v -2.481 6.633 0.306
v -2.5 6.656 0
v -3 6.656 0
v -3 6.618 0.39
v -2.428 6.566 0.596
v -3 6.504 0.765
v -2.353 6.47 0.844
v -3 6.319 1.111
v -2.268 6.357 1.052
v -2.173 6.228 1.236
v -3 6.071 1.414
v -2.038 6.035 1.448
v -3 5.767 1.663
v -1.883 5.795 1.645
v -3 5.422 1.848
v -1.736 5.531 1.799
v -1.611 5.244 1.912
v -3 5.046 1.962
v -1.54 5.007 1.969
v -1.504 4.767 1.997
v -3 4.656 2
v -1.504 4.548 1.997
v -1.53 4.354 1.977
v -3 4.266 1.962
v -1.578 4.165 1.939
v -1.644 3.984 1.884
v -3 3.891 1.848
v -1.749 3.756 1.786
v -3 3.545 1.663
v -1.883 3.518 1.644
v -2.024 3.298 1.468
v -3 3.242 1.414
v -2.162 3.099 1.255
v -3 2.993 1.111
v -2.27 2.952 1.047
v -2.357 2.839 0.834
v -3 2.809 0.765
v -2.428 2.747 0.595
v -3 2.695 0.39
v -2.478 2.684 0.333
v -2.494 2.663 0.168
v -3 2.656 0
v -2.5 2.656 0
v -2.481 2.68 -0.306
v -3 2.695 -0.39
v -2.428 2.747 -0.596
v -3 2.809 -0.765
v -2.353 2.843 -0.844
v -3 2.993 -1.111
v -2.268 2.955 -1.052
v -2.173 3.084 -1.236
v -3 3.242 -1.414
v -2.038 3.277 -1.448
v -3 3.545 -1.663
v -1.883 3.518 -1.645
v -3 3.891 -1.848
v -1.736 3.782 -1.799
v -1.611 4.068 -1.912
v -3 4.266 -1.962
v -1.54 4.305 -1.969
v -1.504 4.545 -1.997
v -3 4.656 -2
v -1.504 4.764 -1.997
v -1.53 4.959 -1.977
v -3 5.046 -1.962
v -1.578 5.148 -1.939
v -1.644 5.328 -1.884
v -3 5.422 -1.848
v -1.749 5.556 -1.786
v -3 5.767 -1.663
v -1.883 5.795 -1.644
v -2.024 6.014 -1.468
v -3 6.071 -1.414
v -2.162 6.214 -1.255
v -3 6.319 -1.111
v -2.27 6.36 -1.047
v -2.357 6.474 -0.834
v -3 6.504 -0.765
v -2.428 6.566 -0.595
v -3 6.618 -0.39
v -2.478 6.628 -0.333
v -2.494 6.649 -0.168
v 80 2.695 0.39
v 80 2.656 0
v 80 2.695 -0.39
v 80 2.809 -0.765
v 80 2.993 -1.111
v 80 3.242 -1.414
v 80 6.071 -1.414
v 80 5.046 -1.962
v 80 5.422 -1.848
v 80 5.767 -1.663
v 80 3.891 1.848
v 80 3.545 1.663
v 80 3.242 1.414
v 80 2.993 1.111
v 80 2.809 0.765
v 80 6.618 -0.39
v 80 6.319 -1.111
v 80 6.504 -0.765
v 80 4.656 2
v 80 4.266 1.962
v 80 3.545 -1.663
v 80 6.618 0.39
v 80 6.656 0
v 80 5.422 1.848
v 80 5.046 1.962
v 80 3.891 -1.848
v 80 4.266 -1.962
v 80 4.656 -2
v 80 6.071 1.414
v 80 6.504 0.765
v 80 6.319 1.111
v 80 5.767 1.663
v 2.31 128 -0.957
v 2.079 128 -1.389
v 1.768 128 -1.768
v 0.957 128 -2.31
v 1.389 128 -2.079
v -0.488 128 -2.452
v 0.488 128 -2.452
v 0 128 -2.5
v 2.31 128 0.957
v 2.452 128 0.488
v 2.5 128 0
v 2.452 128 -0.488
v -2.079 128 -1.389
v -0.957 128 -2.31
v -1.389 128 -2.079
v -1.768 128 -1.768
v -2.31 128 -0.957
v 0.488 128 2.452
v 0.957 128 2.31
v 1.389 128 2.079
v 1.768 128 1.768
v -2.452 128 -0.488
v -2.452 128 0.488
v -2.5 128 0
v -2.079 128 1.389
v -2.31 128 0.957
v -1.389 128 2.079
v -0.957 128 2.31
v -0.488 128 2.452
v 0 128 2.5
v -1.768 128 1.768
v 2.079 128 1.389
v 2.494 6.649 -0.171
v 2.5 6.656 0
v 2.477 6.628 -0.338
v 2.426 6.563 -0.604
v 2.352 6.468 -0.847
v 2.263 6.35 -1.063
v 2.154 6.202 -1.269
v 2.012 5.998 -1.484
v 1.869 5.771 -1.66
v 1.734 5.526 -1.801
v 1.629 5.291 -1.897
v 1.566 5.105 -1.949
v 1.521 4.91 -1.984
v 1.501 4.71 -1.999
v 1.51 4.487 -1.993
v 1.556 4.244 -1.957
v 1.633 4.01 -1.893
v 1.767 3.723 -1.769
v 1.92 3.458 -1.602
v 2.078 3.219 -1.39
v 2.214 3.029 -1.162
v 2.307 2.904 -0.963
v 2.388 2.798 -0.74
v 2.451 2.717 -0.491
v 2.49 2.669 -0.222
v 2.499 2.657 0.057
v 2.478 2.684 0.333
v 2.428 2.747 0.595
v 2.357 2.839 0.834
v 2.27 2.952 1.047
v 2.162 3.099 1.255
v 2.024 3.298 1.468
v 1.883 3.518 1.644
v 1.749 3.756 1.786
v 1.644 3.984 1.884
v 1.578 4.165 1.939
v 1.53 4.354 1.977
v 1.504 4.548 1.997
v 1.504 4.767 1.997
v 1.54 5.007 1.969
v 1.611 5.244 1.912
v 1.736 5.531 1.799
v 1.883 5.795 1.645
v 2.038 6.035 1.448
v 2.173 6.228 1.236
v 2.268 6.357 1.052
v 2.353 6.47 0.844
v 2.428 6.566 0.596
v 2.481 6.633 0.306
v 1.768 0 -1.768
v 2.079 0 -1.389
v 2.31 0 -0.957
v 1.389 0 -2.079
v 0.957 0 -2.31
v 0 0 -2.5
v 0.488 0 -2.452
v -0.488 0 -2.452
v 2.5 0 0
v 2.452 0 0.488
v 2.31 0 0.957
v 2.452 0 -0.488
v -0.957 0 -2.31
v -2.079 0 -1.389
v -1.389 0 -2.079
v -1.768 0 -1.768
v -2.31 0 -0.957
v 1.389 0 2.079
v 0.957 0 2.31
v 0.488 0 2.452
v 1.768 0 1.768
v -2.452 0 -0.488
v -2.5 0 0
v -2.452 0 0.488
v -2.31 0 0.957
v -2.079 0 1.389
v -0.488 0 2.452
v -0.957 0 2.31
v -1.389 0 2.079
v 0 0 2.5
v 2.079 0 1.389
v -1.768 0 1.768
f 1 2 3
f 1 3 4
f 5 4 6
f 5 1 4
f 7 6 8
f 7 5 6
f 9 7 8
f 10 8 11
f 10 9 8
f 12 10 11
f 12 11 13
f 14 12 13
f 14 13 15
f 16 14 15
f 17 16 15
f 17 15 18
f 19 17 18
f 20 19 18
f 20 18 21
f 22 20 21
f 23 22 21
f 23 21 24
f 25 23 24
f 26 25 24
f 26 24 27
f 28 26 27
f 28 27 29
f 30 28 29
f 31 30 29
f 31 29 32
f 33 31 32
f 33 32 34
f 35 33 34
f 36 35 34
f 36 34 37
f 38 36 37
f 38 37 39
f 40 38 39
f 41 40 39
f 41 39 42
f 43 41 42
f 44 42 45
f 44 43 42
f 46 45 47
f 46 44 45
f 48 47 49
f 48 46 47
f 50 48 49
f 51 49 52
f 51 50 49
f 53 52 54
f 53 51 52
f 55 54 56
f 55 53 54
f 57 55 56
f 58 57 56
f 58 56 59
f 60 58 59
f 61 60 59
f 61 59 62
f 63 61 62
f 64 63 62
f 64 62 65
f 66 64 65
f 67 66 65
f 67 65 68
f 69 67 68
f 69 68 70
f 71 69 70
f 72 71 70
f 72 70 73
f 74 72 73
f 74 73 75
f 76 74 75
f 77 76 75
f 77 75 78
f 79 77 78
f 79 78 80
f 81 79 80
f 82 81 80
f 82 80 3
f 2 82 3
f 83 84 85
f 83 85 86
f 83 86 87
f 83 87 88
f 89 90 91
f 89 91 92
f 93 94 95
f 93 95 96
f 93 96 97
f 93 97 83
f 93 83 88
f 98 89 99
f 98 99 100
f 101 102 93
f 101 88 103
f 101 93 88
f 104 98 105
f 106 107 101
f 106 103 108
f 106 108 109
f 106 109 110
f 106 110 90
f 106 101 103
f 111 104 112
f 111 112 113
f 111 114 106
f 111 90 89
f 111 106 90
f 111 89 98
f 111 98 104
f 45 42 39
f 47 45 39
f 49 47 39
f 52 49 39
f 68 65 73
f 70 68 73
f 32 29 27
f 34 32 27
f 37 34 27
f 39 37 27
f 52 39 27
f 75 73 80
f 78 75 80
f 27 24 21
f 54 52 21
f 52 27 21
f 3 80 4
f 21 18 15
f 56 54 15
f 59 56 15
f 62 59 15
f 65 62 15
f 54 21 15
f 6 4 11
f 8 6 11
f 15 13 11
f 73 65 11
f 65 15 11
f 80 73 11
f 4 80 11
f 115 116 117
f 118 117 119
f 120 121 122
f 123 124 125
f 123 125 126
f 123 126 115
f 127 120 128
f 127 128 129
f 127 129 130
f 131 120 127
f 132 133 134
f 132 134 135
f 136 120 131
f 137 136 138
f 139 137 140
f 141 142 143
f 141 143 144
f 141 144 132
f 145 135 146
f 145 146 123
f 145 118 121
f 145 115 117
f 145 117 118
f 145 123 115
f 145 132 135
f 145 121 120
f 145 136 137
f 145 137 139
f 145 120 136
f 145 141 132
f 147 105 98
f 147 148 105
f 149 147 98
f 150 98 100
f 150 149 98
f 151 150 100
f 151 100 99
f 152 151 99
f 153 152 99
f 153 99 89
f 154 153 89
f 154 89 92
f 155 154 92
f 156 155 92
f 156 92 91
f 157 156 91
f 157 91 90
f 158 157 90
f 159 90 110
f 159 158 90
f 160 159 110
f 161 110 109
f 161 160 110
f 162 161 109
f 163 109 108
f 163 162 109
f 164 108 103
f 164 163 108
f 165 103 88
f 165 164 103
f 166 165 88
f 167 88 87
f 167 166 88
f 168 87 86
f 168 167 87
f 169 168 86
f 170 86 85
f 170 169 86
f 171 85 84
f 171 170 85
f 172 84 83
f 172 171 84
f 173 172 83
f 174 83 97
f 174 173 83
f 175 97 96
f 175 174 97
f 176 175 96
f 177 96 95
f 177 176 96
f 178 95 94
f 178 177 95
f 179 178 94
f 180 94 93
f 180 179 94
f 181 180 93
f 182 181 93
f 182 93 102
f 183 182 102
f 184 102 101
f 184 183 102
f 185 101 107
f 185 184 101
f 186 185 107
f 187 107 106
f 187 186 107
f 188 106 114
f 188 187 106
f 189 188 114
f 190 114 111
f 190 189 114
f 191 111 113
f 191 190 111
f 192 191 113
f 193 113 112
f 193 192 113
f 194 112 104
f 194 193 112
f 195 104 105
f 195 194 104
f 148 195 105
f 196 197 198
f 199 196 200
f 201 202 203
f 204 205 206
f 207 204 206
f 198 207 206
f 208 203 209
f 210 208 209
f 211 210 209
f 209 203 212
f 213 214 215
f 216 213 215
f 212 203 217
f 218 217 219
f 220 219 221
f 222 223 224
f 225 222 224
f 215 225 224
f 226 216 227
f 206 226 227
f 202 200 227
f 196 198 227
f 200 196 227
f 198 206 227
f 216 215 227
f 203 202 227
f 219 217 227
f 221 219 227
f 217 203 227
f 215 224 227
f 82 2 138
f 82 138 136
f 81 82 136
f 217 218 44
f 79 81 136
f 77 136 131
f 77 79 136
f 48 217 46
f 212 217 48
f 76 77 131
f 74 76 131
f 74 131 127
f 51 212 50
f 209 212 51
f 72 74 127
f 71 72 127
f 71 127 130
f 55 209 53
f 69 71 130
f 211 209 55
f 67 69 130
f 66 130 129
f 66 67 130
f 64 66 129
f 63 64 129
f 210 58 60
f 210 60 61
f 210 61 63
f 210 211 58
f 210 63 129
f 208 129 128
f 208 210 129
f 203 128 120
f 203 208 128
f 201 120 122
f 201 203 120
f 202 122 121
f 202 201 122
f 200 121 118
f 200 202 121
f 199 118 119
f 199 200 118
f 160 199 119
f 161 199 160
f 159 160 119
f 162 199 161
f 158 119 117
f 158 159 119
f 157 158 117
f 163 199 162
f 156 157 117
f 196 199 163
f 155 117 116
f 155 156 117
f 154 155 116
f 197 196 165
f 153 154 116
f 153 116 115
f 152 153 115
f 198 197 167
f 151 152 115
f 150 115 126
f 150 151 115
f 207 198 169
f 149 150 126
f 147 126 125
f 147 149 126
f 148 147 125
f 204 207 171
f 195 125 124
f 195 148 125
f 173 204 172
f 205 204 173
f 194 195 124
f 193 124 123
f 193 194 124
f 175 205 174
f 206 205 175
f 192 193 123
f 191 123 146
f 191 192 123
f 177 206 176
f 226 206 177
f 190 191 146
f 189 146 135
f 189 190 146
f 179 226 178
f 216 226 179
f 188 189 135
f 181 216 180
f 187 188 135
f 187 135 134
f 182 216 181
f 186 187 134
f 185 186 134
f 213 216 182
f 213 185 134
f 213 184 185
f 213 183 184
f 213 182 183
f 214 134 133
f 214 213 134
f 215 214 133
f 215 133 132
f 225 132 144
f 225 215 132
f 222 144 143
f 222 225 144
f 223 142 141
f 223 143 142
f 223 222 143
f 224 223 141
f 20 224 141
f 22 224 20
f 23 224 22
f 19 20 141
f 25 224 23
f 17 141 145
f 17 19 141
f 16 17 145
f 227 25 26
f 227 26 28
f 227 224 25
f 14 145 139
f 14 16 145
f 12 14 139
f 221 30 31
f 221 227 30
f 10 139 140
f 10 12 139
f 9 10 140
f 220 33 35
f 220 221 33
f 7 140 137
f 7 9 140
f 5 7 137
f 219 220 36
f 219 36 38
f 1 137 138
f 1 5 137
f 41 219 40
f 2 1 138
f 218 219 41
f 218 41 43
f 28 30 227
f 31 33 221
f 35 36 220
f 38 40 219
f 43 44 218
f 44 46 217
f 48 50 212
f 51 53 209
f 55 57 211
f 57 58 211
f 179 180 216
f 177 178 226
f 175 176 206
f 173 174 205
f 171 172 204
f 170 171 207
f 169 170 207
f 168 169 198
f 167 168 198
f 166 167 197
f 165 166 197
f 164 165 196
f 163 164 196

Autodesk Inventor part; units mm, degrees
ref_plane "YZ Plane" through (0, 0, 0) normal (1, 0, 0) x (0, 1, 0)
ref_plane "XZ Plane" through (0, 0, 0) normal (0, 1, 0) x (-1, 0, 0)
ref_plane "XY Plane" through (0, 0, 0) normal (0, 0, 1) x (1, 0, 0)
sketch "Sketch1" plane through (0, 0, 0) normal (0, 1, 0) x (-1, 0, 0)
  circle A0 centre (0, 0) radius 2.5
  dimension "d0" = 5
extrude "Extrusion1" add sketch "Sketch1" along normal blind 128
sketch "Sketch2" plane through (0, 0, 0) normal (1, 0, 0) x (0, 1, 0)
  circle A0 centre (4.6563, 0) radius 2
  point P0 (0, 0)
  dimension "d3" = 4
extrude "Extrusion2" add sketch "Sketch2" along normal blind 80 and the other way blind 3
properties part number "AssemblyAnalysis"
